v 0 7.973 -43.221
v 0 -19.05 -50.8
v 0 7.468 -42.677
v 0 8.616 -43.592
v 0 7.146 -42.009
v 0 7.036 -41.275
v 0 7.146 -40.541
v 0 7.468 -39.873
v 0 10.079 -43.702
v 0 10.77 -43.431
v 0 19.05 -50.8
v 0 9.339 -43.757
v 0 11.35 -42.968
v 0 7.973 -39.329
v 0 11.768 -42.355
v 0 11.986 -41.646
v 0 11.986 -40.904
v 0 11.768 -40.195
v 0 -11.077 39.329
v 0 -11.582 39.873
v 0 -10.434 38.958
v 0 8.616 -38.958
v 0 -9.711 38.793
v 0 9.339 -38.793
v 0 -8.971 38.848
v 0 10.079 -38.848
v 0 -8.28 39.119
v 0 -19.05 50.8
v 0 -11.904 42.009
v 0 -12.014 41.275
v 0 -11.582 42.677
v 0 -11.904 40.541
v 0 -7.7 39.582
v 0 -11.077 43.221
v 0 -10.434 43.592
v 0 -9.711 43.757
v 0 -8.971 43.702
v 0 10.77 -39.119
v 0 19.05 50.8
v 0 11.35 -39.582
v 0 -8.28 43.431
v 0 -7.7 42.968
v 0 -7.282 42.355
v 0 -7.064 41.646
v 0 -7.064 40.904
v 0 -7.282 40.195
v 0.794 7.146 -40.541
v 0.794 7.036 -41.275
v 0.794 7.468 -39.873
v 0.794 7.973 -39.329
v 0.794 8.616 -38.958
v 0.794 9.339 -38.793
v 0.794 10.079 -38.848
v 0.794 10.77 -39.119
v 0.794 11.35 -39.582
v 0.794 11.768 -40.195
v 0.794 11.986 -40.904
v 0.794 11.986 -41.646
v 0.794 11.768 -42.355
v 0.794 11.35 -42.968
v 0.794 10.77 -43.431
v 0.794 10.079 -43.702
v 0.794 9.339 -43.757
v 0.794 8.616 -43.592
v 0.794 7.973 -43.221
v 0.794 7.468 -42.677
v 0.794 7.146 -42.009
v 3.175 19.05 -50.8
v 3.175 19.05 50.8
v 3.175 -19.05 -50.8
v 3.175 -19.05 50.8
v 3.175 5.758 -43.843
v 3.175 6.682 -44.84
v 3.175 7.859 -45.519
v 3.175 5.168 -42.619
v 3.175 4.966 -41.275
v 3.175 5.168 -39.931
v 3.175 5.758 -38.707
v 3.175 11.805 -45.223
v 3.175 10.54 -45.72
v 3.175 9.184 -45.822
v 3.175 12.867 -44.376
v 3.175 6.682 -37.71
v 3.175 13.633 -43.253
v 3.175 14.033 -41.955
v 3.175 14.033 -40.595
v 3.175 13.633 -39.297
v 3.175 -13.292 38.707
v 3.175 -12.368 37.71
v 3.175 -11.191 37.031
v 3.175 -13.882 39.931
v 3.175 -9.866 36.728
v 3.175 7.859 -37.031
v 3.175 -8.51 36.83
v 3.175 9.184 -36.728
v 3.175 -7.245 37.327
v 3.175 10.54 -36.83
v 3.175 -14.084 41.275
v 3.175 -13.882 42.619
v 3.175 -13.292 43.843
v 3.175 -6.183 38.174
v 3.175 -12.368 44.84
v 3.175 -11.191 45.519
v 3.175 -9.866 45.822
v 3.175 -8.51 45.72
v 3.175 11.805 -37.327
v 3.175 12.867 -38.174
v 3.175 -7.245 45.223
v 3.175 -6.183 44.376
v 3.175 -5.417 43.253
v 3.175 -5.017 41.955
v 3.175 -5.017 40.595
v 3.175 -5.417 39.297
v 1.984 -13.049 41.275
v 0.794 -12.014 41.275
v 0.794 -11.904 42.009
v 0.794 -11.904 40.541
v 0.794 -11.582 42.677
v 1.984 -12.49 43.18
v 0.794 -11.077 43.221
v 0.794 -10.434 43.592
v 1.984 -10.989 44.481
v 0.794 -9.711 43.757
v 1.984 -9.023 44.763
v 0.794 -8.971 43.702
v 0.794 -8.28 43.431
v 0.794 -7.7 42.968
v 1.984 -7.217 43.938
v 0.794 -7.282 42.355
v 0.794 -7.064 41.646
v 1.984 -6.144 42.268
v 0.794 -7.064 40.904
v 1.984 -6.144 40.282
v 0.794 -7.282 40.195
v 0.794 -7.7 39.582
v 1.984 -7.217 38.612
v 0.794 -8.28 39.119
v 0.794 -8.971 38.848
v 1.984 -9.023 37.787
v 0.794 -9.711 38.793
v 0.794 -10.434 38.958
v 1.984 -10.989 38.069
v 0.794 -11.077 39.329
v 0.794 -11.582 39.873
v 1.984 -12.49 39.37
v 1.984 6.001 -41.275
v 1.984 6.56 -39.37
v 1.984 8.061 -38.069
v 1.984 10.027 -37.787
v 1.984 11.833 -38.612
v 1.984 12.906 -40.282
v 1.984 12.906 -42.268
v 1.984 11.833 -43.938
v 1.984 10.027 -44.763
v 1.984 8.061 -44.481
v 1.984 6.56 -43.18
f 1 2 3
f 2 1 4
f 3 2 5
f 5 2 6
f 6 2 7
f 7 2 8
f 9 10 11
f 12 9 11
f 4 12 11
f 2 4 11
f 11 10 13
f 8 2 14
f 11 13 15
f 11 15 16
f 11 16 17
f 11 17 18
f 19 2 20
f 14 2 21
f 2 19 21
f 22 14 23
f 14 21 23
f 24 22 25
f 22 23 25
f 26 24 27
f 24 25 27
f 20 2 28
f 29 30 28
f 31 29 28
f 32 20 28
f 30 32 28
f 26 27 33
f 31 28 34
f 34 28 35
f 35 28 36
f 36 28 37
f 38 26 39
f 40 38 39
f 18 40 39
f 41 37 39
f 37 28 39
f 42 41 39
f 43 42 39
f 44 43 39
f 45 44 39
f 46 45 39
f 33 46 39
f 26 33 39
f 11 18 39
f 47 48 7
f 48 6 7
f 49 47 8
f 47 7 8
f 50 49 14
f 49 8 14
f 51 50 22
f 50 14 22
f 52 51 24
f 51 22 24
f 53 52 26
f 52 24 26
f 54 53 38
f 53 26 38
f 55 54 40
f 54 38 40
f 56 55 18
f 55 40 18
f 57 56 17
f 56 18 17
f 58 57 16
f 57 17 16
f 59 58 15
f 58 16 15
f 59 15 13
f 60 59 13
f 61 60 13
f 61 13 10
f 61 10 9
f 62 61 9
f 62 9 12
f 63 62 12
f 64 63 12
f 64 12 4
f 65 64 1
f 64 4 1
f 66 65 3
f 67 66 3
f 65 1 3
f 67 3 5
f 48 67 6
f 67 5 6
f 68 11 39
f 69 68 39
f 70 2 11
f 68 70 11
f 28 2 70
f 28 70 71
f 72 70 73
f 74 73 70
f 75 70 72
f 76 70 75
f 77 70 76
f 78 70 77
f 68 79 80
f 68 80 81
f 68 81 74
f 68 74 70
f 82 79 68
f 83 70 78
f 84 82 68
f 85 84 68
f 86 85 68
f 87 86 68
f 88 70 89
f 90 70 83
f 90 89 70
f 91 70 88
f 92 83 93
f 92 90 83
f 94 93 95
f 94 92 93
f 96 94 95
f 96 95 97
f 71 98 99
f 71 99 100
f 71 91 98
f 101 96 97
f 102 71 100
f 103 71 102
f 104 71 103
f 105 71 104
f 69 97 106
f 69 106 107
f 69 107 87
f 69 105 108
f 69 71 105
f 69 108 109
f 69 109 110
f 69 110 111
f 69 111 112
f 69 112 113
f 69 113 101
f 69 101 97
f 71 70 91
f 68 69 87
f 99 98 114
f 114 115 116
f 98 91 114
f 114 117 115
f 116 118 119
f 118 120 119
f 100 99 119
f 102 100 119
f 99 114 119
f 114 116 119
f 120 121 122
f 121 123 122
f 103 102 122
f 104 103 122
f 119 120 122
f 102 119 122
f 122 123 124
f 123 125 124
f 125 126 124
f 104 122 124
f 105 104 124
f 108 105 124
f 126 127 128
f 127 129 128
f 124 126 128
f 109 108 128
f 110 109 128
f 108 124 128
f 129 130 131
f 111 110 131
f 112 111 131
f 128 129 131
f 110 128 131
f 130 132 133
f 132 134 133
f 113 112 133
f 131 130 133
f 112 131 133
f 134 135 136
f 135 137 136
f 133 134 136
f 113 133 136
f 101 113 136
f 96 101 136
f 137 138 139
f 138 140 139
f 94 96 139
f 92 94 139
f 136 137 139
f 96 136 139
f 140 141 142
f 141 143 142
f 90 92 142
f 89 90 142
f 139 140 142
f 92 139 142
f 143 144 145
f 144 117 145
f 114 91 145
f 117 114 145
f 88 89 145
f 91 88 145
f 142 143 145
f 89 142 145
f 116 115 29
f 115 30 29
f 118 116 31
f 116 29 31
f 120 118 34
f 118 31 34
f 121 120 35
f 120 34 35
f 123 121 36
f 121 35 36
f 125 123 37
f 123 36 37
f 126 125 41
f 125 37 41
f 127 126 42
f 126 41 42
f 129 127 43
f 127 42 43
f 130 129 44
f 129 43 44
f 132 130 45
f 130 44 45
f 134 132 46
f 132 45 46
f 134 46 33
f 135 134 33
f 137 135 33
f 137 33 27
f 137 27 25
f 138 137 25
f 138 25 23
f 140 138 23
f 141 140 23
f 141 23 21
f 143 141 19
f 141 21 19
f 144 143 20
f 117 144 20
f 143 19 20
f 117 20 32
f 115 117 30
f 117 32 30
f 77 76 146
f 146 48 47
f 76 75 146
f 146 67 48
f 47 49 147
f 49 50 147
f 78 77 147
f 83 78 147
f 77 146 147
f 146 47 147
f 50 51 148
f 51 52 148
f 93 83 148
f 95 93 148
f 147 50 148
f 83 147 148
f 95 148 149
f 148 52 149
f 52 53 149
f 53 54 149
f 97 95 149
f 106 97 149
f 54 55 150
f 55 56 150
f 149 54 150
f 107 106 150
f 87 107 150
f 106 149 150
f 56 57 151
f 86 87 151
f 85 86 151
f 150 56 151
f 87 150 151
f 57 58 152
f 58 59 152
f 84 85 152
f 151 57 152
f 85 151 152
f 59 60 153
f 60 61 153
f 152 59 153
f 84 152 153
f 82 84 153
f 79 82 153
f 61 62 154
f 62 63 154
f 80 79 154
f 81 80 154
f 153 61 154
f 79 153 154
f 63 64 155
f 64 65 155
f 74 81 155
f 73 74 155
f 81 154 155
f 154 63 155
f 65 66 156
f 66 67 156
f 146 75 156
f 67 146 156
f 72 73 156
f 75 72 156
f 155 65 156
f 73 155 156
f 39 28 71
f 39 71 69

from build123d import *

# Parameters (mm, degrees)
F0_W           = 38.1
F0_H           = 101.6
F1_DEPTH       = 3.175
F3_D           = 4.9784
F3_CSINK_D     = 9.1186
F3_CSINK_ANGLE = 82


# Not quite as in the source:
# - a feature names something its author has since deleted; it is built from what else it names


with BuildPart() as f1:
    # F0 (on Right) → F1 (new body)
    with BuildSketch(Plane.YZ):
        Rectangle(F0_W, F0_H)
    extrude(amount=F1_DEPTH)

    # F3 (through all)
    with Locations(Plane.YZ.offset(3.175)):
        with Locations((-9.525, 41.275), (9.525, -41.275)):
            CounterSinkHole(F3_D / 2, F3_CSINK_D / 2, counter_sink_angle=F3_CSINK_ANGLE)


solid = f1.part
